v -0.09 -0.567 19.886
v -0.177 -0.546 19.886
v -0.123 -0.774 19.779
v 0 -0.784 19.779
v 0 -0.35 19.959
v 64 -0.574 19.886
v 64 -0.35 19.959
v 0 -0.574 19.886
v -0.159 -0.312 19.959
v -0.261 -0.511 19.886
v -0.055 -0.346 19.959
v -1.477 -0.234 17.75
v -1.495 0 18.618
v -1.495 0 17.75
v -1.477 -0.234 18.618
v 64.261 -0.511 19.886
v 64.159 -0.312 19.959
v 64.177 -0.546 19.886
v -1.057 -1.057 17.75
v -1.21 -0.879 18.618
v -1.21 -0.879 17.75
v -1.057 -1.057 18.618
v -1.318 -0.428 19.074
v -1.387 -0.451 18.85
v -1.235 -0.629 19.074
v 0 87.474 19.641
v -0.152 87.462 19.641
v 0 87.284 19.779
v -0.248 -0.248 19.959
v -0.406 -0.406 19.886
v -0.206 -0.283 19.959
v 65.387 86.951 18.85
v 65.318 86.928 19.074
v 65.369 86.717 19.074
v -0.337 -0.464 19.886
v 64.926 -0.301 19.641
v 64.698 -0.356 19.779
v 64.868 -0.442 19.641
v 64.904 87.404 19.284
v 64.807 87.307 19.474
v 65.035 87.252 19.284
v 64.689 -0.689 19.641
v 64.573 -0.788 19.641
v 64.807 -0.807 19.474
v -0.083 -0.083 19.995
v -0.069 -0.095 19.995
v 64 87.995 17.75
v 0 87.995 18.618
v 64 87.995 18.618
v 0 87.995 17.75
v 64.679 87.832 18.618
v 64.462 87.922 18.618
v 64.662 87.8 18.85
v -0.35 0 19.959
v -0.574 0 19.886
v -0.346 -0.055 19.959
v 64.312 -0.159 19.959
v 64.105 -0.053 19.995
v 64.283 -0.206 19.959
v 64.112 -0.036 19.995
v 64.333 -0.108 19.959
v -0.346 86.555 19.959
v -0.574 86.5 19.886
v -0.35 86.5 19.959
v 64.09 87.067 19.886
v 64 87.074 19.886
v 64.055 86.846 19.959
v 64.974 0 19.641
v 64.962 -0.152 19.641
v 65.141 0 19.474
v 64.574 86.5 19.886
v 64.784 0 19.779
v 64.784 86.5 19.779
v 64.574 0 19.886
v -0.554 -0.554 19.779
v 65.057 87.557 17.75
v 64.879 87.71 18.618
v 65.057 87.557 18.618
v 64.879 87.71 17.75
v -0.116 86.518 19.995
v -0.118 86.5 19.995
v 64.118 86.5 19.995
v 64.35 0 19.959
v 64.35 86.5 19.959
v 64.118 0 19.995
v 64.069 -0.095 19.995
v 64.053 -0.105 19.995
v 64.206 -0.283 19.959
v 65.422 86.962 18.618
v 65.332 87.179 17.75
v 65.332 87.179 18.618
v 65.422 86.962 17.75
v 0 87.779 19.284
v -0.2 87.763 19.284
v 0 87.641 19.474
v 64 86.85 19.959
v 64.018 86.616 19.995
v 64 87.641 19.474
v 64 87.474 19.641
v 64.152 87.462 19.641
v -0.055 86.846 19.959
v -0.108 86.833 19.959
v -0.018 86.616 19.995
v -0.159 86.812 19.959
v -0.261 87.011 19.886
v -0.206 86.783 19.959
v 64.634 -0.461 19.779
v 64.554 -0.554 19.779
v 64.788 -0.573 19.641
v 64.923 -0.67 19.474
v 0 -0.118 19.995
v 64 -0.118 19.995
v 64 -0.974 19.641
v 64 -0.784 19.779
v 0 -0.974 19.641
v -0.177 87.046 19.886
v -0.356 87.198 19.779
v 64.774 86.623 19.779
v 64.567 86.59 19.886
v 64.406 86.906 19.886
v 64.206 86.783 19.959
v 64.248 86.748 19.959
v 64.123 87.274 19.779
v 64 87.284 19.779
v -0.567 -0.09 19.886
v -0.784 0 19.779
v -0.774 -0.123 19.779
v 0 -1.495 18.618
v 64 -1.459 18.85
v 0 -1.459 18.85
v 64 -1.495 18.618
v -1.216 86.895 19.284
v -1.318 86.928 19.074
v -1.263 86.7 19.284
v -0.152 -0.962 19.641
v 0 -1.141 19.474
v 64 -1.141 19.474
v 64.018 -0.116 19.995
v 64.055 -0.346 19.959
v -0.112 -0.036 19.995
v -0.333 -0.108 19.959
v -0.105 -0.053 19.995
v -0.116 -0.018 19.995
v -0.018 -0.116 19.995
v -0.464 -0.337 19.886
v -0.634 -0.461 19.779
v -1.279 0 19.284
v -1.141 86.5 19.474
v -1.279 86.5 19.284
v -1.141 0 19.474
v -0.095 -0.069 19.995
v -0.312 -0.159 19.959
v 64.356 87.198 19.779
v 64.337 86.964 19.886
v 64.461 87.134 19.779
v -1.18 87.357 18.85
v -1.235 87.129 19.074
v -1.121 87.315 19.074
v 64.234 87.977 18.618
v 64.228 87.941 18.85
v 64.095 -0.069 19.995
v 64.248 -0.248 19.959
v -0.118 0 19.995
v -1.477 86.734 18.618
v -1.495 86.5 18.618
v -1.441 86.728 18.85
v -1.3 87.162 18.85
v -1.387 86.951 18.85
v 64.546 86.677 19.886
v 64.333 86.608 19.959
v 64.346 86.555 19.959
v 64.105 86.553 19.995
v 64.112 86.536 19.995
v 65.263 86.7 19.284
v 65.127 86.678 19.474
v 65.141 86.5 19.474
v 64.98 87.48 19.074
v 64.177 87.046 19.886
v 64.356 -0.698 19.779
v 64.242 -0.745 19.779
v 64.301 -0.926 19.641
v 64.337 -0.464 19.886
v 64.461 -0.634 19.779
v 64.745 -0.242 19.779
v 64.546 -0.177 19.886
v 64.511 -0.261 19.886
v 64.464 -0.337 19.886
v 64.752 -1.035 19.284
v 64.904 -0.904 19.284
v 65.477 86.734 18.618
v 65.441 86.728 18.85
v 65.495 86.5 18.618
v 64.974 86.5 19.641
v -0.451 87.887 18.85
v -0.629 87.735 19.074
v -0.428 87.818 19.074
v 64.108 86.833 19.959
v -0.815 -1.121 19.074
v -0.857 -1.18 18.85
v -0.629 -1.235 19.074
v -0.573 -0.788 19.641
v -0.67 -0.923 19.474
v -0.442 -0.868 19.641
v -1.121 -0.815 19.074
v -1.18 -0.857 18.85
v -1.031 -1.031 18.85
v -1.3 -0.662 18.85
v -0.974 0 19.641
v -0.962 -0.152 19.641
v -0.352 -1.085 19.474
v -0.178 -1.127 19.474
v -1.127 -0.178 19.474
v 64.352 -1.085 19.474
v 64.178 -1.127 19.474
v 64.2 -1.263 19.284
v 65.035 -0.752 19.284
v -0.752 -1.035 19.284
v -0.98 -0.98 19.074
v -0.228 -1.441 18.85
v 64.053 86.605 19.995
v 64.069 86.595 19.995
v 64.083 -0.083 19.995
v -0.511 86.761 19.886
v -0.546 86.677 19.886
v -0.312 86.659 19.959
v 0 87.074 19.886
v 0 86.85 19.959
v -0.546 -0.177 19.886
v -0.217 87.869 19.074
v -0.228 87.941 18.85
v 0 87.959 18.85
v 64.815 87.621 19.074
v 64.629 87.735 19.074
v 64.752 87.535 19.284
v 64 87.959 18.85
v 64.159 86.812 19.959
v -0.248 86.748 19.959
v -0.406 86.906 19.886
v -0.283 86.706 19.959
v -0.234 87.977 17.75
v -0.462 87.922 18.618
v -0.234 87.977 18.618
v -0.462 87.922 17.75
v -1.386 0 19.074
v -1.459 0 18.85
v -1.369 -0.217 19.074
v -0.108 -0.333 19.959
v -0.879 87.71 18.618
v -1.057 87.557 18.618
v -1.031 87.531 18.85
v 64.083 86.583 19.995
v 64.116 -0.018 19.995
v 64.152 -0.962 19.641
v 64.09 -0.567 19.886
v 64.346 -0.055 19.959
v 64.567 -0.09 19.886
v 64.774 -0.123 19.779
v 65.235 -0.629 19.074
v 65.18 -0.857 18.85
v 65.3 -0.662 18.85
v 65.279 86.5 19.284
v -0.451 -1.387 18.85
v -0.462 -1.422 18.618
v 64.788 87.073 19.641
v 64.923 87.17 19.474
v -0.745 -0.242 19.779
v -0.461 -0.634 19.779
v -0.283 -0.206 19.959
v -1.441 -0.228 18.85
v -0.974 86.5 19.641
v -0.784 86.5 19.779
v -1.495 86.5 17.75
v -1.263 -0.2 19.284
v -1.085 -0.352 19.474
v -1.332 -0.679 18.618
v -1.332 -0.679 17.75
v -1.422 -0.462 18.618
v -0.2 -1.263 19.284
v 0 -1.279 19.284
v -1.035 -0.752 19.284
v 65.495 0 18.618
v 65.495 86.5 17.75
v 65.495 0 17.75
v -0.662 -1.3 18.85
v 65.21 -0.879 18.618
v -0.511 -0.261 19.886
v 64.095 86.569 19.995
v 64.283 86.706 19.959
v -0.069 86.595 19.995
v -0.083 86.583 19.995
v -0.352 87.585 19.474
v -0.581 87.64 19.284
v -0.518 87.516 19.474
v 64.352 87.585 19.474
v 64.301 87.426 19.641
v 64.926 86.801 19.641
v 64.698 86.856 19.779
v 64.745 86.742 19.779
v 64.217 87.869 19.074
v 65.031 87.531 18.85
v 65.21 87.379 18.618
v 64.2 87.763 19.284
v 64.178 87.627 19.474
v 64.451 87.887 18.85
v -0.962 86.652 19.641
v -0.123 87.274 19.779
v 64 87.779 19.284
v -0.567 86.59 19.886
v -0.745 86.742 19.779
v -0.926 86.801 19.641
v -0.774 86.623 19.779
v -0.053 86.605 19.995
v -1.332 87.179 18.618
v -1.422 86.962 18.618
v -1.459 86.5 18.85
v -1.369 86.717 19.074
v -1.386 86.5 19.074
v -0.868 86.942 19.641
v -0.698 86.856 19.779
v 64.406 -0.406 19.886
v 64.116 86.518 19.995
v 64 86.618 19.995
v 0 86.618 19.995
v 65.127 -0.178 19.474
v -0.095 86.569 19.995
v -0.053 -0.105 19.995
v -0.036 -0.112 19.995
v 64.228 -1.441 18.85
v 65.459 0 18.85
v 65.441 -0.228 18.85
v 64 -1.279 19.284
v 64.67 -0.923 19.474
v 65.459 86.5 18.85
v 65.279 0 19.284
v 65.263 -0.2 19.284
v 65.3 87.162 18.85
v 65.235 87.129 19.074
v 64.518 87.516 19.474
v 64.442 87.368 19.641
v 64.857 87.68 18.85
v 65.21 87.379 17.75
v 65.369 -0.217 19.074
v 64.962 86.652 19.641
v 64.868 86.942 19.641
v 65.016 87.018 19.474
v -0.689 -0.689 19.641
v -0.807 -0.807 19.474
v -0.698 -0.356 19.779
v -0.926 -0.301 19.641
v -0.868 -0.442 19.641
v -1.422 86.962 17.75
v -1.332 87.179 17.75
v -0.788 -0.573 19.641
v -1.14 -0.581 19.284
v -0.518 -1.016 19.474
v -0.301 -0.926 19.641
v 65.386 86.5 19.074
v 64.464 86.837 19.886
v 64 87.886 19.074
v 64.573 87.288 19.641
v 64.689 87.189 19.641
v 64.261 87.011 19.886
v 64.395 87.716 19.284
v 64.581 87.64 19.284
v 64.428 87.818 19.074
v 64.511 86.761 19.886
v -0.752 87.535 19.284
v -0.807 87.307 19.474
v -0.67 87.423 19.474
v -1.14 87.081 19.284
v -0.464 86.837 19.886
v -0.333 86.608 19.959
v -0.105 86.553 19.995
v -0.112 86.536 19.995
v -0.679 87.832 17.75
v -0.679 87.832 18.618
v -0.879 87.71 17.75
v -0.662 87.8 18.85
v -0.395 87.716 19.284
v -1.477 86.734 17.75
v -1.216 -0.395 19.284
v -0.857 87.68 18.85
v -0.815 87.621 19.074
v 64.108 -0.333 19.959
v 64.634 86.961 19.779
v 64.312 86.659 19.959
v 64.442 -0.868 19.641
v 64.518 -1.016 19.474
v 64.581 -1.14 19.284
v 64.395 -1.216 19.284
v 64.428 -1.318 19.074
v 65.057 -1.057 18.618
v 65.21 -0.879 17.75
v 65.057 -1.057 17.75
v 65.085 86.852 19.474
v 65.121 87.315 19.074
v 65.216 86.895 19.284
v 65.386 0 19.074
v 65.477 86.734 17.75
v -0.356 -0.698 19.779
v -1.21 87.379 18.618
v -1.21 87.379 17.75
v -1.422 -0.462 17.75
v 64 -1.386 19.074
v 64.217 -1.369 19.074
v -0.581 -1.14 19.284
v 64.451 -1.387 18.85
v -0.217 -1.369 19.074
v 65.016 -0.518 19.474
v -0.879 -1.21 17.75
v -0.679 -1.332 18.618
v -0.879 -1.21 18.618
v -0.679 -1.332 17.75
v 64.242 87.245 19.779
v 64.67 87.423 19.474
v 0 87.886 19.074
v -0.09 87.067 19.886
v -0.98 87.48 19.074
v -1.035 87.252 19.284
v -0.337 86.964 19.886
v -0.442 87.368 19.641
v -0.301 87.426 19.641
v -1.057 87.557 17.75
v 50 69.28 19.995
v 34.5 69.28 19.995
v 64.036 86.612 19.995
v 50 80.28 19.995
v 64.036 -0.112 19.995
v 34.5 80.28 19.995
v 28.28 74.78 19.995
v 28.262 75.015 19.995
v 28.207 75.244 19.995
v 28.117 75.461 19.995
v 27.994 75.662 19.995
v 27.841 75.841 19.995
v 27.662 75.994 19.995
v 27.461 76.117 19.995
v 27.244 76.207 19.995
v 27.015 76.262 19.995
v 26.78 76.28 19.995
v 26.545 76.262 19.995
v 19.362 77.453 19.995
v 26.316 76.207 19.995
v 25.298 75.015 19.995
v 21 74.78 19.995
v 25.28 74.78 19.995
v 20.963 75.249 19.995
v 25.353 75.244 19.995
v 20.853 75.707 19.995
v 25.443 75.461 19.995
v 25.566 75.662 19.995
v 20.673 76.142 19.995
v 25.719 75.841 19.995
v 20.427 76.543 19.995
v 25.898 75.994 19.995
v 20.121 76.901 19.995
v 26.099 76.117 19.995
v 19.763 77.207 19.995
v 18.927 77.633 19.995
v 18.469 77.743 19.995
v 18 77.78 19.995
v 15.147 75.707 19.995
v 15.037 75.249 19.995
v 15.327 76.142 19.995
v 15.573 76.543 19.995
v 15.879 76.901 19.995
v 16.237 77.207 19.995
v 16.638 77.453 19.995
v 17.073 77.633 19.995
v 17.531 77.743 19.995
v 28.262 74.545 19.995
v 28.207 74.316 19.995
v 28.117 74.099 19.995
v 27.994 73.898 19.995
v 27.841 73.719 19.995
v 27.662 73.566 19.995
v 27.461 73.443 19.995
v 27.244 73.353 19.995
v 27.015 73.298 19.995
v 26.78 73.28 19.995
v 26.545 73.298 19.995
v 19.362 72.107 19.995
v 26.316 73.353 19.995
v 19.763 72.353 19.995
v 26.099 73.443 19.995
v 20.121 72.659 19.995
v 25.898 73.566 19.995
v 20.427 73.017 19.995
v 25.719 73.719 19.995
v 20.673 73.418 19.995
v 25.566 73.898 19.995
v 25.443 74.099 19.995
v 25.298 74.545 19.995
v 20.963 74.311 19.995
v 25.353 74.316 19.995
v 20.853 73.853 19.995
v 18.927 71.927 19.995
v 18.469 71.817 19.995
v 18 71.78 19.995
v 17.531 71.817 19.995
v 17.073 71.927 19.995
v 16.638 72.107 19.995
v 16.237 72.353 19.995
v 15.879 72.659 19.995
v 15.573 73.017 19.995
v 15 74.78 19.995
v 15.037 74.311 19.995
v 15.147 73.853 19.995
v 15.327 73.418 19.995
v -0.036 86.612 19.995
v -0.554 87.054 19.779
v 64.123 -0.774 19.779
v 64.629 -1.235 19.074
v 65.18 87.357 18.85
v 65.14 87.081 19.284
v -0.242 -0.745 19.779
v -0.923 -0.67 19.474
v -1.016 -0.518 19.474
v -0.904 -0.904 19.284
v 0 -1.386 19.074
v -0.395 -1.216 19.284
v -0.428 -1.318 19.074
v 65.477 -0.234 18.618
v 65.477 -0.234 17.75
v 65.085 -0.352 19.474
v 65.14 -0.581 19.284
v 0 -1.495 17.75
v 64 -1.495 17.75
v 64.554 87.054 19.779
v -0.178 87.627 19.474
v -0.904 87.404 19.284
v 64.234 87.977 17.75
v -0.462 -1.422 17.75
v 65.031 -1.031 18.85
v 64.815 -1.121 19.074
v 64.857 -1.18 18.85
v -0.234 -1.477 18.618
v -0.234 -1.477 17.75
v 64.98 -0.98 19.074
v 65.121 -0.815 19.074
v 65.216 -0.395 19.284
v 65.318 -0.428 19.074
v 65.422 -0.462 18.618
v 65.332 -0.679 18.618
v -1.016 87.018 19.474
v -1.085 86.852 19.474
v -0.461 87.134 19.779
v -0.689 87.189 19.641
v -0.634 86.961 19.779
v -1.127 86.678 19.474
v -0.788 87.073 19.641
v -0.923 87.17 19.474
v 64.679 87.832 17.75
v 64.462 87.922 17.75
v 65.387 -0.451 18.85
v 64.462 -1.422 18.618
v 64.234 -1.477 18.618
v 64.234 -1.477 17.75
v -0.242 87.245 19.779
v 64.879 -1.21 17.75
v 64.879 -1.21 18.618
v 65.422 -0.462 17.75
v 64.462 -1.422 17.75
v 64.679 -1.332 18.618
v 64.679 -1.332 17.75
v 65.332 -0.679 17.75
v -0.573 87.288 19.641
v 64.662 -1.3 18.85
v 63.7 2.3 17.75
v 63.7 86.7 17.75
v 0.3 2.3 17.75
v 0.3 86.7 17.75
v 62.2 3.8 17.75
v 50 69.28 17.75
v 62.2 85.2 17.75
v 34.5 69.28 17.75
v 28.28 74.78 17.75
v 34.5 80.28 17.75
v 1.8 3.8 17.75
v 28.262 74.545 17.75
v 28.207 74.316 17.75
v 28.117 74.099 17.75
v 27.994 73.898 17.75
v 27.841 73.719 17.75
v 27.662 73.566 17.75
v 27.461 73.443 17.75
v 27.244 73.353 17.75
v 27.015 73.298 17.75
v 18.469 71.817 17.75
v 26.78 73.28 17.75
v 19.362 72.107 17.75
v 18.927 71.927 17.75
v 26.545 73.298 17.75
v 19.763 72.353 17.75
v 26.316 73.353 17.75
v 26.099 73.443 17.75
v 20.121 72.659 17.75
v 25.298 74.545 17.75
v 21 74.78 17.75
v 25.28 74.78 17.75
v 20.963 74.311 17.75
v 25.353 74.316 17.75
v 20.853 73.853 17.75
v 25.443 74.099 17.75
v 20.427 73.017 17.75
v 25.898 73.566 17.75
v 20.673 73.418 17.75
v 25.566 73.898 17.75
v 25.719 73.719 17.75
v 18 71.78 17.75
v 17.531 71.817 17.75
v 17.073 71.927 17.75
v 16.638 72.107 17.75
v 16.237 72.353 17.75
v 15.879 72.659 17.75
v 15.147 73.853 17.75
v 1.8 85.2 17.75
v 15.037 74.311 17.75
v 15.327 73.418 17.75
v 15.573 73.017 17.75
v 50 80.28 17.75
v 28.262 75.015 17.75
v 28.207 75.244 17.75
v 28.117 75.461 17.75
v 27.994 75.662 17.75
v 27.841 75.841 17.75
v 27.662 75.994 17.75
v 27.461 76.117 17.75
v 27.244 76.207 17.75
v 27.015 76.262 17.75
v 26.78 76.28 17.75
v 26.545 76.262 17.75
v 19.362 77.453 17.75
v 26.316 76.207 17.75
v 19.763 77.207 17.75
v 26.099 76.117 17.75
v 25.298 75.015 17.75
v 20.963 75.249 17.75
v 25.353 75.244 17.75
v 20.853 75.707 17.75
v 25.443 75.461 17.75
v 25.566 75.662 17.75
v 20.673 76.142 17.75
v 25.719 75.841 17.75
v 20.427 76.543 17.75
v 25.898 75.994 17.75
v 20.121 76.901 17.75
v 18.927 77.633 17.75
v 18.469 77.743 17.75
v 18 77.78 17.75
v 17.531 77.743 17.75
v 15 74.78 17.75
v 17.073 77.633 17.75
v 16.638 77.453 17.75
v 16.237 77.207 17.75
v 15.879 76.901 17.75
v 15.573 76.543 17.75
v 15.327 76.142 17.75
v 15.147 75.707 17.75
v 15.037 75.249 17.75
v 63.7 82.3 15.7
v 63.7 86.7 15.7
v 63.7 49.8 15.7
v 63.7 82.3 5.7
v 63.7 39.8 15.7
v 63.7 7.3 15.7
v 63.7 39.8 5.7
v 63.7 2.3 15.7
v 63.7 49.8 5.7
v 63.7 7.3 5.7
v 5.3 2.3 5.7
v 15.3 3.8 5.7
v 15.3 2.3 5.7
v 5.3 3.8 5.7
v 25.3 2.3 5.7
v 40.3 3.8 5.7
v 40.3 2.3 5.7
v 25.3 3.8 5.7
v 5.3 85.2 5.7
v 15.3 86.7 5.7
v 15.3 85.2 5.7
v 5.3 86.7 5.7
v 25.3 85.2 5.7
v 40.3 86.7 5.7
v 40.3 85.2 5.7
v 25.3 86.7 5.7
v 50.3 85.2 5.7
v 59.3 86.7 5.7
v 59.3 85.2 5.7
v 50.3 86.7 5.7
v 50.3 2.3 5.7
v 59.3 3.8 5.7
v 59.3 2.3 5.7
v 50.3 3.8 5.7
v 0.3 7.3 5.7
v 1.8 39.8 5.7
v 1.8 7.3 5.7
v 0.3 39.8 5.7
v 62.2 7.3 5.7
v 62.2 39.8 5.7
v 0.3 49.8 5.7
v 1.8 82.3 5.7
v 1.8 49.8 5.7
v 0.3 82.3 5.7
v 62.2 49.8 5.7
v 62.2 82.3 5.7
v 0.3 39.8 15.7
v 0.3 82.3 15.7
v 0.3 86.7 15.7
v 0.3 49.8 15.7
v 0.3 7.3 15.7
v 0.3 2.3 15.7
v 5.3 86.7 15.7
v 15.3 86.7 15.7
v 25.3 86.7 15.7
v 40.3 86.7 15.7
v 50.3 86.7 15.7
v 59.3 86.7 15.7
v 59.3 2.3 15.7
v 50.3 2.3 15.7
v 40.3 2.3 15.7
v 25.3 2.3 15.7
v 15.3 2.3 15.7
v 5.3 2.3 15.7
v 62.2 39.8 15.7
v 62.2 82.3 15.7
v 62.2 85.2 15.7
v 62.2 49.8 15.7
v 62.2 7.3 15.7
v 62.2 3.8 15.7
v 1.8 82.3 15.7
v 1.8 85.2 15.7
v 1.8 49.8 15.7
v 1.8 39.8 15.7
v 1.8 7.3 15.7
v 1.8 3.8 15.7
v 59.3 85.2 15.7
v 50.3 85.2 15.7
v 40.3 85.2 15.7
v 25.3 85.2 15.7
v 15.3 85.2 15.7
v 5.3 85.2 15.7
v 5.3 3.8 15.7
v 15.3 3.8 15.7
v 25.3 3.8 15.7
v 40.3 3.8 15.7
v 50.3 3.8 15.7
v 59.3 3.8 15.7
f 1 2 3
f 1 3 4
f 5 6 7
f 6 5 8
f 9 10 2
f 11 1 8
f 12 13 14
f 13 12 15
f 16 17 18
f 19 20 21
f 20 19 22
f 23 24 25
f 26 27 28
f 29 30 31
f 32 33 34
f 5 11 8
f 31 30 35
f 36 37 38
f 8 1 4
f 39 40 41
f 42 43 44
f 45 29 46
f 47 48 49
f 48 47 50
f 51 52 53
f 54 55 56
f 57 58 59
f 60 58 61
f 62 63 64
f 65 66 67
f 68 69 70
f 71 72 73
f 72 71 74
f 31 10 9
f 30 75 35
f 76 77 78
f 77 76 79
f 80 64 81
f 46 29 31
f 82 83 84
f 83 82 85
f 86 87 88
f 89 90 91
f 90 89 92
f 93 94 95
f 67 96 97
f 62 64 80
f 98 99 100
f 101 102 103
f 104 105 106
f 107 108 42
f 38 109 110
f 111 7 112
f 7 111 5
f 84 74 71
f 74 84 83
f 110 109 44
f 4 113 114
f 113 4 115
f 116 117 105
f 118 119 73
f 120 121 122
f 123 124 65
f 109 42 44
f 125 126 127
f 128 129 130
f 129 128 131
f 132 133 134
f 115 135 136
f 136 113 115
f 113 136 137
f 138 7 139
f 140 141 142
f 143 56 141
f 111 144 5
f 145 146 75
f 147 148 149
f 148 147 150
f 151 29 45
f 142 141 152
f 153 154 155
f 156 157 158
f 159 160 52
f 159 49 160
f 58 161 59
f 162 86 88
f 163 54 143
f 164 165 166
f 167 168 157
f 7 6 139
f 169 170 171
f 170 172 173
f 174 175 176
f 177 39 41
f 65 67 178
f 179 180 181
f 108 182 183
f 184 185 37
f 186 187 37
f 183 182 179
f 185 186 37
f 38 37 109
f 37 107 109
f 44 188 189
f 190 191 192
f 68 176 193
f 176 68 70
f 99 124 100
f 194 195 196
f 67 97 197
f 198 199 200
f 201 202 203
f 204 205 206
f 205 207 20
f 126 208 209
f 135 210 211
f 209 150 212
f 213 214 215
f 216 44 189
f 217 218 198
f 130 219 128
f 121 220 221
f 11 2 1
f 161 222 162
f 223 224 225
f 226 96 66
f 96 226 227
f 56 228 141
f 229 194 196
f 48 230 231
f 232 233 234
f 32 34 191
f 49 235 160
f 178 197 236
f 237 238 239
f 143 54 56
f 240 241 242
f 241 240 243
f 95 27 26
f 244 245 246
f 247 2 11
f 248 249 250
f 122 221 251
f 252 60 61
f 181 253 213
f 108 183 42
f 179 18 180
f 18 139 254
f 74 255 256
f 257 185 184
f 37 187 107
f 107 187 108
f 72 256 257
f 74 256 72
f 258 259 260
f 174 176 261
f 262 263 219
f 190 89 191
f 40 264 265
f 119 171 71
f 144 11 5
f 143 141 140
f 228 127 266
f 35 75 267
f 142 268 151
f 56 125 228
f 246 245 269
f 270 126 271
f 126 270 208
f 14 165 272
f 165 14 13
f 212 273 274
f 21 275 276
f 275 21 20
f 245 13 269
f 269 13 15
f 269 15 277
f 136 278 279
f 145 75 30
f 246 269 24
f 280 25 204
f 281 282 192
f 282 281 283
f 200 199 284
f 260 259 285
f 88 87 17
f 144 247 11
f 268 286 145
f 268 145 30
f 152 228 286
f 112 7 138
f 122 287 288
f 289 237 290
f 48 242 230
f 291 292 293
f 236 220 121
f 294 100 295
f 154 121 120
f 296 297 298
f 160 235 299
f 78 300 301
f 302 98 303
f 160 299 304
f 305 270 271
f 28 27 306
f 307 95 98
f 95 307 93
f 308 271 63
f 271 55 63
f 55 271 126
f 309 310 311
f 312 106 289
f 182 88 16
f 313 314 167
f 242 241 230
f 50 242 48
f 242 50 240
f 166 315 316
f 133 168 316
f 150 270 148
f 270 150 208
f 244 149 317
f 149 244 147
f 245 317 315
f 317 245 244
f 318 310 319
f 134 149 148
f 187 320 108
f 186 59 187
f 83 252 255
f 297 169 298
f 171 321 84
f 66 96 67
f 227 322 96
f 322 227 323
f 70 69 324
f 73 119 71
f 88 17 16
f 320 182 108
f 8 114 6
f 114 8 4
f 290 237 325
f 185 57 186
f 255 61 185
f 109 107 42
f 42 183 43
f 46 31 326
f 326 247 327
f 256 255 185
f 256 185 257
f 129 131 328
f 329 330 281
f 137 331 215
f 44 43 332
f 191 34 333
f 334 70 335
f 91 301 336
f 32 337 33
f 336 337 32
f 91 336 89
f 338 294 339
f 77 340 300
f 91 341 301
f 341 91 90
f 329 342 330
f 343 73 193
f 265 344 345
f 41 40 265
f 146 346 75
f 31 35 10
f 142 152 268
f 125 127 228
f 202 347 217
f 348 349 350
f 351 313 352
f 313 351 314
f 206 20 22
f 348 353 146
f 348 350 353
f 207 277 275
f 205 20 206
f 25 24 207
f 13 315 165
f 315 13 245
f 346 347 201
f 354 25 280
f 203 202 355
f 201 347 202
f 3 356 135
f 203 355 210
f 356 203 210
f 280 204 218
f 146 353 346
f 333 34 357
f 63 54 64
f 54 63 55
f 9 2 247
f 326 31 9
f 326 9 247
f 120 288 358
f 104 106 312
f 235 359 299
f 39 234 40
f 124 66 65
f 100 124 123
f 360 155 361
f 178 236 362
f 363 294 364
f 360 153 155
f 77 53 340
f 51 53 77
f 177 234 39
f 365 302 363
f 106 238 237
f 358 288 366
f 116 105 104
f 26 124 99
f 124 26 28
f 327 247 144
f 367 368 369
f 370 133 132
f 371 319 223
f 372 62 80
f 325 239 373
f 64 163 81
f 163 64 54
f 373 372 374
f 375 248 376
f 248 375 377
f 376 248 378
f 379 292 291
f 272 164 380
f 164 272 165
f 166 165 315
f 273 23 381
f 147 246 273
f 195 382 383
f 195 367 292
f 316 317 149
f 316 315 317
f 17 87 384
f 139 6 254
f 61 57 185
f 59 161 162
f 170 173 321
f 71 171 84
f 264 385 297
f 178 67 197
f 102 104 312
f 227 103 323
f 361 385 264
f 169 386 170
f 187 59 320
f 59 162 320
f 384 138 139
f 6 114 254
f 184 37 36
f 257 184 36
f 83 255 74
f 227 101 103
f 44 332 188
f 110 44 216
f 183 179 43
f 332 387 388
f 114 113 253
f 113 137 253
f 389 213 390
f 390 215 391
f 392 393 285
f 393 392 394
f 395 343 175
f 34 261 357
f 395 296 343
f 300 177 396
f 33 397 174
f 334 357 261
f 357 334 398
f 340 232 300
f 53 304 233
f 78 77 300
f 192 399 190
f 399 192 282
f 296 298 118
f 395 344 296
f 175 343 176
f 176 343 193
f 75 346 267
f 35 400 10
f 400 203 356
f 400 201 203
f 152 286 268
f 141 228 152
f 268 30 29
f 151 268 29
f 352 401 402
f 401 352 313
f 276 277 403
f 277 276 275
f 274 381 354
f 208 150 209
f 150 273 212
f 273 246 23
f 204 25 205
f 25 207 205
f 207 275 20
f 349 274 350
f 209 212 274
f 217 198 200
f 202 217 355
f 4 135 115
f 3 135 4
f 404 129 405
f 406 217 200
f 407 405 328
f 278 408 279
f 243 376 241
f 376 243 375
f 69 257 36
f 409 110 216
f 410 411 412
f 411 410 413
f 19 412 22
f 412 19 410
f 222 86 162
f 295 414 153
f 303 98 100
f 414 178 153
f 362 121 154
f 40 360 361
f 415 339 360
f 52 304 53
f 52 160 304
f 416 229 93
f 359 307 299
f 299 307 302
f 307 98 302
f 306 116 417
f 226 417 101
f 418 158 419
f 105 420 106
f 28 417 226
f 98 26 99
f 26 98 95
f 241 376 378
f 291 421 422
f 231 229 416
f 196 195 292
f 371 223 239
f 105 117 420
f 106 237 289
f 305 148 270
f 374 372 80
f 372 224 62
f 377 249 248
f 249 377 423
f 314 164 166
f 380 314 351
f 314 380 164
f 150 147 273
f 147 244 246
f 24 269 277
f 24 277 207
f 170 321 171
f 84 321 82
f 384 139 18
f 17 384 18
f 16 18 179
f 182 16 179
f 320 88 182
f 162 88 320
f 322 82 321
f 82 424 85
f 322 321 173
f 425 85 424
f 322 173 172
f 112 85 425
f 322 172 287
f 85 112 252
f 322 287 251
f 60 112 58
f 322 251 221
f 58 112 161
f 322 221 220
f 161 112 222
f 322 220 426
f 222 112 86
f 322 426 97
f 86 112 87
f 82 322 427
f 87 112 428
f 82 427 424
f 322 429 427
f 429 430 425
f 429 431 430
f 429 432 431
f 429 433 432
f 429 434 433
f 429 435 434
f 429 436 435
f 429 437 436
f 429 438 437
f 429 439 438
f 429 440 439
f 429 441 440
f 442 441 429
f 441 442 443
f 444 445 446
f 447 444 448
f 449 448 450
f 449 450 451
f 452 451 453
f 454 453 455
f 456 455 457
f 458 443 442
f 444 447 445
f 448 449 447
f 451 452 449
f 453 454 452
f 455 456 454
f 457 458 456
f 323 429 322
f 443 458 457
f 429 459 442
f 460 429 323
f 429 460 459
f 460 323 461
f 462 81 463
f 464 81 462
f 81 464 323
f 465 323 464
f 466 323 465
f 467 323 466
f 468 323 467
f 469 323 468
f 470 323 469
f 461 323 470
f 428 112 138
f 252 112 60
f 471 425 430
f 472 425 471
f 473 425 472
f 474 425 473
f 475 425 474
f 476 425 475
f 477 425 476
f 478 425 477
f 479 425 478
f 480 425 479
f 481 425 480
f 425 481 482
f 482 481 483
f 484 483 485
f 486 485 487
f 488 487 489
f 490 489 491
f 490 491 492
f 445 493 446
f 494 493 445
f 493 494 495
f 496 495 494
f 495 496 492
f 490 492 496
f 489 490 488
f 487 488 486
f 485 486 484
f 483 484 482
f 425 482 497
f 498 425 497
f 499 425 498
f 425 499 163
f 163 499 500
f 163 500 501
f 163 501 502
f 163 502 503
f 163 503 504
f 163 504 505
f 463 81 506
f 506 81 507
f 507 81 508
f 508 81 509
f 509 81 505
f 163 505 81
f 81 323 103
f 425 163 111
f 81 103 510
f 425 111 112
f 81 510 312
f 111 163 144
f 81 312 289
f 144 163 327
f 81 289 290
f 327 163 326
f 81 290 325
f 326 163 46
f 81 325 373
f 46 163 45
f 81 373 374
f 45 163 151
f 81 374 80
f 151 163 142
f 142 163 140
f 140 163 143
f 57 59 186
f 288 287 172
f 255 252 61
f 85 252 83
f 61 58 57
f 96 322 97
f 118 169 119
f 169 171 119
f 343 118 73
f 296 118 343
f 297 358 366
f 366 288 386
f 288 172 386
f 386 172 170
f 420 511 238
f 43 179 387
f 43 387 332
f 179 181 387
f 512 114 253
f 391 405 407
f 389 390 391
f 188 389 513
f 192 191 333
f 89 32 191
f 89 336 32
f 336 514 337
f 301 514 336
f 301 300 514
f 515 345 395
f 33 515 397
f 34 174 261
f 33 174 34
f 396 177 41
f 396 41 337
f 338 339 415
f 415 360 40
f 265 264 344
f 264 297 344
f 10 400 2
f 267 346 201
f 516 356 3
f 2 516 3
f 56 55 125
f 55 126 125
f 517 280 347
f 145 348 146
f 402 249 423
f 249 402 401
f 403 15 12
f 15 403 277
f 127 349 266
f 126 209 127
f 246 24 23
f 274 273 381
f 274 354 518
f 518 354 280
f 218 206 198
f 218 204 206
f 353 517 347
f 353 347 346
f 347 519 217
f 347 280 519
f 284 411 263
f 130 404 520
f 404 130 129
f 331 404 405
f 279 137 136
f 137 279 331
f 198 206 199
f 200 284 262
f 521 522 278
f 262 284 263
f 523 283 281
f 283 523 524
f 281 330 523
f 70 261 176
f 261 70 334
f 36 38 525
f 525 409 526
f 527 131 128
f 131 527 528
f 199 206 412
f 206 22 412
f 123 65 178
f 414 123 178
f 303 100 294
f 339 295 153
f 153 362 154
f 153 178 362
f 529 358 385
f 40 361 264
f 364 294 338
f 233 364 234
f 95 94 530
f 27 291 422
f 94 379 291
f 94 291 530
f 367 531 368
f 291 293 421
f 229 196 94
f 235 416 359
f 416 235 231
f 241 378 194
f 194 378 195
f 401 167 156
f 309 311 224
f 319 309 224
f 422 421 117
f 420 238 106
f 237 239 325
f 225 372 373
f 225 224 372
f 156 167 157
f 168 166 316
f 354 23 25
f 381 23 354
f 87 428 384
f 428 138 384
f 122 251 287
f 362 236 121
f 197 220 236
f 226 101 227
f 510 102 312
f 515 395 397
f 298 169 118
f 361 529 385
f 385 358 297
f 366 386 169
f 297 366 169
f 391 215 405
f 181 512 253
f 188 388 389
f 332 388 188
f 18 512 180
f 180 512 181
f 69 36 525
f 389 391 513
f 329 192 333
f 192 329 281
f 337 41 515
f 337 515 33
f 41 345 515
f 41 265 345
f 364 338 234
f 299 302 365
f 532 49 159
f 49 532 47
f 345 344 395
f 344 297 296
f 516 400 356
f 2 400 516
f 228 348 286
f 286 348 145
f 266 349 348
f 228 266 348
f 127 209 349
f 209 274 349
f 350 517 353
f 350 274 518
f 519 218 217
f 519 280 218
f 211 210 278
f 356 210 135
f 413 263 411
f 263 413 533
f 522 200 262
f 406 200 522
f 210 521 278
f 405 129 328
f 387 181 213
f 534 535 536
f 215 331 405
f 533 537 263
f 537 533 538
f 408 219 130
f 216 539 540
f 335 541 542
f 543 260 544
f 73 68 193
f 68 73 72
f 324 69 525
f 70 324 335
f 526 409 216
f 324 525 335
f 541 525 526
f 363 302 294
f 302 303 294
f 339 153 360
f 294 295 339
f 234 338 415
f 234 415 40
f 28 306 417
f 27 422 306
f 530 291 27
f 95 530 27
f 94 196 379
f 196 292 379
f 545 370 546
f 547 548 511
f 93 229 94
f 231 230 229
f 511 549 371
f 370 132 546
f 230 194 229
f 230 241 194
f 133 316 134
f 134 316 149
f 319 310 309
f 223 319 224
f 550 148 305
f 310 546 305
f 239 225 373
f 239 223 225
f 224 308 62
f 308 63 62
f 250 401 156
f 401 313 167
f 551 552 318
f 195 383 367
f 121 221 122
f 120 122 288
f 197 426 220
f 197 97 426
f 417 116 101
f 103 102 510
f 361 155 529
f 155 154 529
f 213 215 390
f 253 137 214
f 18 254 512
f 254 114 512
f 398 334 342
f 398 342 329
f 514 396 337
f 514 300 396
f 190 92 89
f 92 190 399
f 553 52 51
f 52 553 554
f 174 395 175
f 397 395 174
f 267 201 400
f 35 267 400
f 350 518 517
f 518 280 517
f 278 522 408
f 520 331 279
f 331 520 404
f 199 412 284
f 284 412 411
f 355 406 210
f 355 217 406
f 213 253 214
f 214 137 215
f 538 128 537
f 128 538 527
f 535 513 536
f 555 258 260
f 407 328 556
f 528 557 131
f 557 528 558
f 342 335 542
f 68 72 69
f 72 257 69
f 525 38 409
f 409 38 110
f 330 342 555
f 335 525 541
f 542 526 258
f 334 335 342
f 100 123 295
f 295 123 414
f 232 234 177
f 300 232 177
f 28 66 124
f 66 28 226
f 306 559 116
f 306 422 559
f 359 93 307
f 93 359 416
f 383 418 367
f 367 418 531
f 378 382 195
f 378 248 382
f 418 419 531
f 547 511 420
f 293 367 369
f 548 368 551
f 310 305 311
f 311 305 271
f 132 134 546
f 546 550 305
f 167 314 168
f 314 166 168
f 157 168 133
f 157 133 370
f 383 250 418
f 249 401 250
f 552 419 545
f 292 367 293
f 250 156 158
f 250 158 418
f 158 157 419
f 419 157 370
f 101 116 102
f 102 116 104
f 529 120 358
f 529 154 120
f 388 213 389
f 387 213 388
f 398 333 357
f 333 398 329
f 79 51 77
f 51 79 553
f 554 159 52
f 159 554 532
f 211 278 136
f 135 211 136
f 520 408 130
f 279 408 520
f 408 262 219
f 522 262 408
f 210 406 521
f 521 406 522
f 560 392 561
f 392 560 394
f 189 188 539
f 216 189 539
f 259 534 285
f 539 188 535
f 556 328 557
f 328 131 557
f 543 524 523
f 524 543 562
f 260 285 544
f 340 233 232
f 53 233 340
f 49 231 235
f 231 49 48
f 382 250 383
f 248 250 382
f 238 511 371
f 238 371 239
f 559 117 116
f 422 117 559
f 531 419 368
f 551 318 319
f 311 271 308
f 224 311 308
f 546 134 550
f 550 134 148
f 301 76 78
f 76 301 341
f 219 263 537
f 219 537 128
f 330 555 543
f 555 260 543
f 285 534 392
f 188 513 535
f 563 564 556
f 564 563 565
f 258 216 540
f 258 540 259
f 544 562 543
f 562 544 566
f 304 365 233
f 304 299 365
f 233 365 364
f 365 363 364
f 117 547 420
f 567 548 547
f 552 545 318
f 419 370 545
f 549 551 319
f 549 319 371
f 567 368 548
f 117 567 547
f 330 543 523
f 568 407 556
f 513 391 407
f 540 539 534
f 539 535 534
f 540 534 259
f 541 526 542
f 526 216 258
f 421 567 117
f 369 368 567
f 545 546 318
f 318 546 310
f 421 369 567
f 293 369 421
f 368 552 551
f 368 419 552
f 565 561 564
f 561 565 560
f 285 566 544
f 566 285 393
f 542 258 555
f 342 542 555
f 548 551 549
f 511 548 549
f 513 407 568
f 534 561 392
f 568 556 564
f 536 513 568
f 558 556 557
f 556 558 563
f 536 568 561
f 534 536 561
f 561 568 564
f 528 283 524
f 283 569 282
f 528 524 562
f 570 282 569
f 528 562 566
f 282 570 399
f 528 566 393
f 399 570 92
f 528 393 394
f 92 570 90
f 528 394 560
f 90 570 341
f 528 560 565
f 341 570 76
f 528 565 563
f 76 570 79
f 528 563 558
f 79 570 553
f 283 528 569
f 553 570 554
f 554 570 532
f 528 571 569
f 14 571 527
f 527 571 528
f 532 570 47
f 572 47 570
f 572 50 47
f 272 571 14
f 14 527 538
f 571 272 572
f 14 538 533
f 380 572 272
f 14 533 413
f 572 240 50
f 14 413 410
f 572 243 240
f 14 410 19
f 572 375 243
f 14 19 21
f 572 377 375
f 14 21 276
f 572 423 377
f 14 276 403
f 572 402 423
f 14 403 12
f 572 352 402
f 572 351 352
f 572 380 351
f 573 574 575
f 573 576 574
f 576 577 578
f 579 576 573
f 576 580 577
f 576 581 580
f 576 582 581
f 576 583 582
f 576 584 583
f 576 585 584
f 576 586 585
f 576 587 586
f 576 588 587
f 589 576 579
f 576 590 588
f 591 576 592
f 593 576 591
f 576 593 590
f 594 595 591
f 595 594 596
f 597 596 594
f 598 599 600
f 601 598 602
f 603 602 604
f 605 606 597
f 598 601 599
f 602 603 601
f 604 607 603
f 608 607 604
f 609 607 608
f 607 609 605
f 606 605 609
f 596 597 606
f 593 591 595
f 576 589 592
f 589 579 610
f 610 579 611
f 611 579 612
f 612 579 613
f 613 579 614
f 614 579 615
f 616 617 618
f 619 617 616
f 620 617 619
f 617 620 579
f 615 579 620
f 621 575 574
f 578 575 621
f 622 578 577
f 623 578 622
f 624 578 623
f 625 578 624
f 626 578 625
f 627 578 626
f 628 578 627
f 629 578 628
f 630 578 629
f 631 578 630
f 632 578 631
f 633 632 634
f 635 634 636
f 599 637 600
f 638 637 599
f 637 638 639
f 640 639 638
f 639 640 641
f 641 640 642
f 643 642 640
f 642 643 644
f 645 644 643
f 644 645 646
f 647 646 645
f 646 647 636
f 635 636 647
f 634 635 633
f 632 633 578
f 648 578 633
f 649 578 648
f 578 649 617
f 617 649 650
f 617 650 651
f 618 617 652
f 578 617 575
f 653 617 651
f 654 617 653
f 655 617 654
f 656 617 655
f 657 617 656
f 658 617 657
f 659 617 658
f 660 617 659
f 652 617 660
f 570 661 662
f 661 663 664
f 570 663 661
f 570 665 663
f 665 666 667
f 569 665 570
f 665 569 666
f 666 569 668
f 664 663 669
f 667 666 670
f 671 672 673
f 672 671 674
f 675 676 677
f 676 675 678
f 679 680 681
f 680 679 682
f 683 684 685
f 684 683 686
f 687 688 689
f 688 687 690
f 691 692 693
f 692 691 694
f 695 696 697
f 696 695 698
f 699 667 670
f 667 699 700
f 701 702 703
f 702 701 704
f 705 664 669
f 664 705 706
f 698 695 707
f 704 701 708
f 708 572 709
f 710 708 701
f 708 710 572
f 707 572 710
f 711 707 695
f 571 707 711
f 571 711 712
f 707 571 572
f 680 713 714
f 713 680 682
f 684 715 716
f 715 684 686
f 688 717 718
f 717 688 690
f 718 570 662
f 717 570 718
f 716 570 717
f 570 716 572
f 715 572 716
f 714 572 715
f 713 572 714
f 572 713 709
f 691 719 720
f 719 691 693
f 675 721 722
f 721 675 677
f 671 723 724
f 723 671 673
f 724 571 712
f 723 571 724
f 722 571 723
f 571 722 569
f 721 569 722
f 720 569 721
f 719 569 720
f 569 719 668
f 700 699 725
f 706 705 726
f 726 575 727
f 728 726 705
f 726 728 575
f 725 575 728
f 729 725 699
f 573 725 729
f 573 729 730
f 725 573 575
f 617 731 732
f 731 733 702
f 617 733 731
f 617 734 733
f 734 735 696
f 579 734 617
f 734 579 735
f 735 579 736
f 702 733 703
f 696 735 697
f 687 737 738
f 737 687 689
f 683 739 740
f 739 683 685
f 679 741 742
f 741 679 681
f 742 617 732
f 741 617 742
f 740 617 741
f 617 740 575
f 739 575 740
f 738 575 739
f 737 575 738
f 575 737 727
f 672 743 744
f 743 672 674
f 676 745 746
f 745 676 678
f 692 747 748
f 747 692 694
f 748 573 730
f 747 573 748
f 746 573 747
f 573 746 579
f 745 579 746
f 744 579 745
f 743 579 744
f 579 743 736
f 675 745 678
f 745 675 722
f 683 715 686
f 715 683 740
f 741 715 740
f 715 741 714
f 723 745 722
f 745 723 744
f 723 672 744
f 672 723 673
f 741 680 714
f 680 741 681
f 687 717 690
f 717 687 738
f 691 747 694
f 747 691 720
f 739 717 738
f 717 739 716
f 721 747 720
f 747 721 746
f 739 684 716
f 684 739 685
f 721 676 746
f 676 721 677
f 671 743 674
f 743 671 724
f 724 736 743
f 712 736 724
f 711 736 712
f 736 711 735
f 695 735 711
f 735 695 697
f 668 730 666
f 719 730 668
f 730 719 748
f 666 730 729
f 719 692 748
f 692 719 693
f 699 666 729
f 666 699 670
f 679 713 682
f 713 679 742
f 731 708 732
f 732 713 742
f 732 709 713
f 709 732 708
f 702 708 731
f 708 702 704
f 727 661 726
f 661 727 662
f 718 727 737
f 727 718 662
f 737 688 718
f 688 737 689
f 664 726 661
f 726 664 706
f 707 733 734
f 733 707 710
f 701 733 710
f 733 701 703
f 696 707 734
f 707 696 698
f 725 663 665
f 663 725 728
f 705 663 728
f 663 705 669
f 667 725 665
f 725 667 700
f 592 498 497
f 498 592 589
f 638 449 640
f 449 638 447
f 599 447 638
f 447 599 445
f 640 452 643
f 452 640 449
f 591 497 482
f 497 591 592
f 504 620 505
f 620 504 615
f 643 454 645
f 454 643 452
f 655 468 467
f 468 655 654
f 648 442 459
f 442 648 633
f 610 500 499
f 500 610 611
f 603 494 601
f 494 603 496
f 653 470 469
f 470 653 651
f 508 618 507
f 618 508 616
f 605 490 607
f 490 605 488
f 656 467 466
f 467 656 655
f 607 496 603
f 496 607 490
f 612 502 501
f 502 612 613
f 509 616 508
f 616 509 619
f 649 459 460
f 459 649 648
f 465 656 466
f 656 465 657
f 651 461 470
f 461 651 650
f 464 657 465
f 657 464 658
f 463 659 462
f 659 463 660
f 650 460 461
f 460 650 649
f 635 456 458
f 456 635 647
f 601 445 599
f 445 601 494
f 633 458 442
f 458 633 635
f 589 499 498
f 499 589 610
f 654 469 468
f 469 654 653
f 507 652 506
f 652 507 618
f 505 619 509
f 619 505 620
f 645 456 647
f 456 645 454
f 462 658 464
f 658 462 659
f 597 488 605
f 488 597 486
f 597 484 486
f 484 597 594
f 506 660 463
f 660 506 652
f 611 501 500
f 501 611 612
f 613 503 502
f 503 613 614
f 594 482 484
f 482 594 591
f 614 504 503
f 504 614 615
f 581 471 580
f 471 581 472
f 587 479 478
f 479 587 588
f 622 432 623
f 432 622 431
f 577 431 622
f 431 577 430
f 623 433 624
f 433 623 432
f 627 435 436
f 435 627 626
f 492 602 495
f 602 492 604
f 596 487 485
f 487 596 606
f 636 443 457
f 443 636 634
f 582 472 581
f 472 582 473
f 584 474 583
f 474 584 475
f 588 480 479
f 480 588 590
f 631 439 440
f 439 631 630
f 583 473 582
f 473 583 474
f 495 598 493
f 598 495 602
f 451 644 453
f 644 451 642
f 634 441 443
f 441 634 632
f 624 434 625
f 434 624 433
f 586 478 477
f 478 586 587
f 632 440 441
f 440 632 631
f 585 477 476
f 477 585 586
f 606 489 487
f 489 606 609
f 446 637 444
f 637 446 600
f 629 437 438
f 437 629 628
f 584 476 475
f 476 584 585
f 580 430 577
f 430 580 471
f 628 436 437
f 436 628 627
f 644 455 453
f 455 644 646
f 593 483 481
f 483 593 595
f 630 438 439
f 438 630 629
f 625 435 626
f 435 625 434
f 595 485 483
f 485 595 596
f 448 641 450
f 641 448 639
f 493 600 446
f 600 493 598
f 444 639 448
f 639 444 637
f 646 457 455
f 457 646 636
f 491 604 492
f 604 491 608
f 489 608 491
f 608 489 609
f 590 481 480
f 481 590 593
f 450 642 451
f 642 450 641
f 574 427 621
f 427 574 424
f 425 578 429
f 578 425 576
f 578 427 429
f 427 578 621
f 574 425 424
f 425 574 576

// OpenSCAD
$fn=40;  // Alto número de caras de polígonos

/********************************************
*** TAPA WIMUMO 005 
********************************************/

ap = 1.5; // ancho pared
ai = 17; // alto interno 
xi = 64; // largo interno en x
yi = 110; // largo en y
cp = 2; // cubre-plug
ypcb = 85;// largo pcb

difference(){
    
    // Cuerpo de la tapa 
    union(){
        intersection(){
            
            //caja_completa();
            // obtengo la tapa
            //translate([-5,-5,ai]){cube([80,82,20]);};
        }
        
        // TAPA PRINCIPAL
        translate([0,0,ai]){caja_tapa(ap,ap,xi,ypcb+ap);}
        // borde
        alto_b = ai-3-1.7;
        margen = 0.3;
        reborde(0+margen,0+cp+margen,ai-alto_b+1,
        ypcb-2*margen,xi-2*margen,1.5,alto_b);
        
        // TAPA BATERIAS -> pasada a otro archivo
        /*
        translate([0,ypcb+cp+2*ap,ai]){
            caja_tapa(ap,ap,xi,yi-ypcb-cp-2*ap);
         }
        alto_tb = 10 ;
        difference(){
        reborde(0+margen,ypcb+cp+3*ap+margen,ai-alto_tb+1,
        yi-ypcb-cp-ap*3-2*margen,xi-2*margen,1.5,alto_tb);
            
         translate([margen+ap,ypcb+cp+2*ap,6]){cube([xi-2*margen-2*ap,20,ai-ap-8]);}
        //translate([]){cube([]);}
        }
        
        */
        
       
        
    };
    
    // Agujeros para botones
    px = 6+2;       // posicion de los postes
    py = 6+cp+2;
    
    // LED
     translate([px+10,py+68-3.22,ai-5]){cylinder(10,3,3);}
    // Reset
    translate([px+18.78,py+68-3.22,ai-5]){cylinder(10,1.5,1.5);};
    // Tecla ON/OFF
    htec = 11;
    translate([px+26.5,py+68-3.22-htec/2,ai-5]){
        cube([42-26.5,htec,16]);
     };
    
}

/* reborde */
module reborde(x,y,z,w,l,a,h){
    translate([x,y,z]){
      difference(){
        // Gran borde
        cube([l,w,h]);
        // Hueco
        translate([a,a,-1]){
          cube([l-2*a,w-2*a,h+2]);
        }
        // Ranuras para formar solapas
        // frente y atras
        translate([15,-5,-7]){
          cube([10,120,ai]);
        }
        translate([40,-5,-7]){
          cube([10,120,ai]);
        }
        // esquineras
        translate([-5,-5,-7]){
          cube([10,10,ai]);
        }
        translate([xi-5,-5,-7]){
          cube([10,10,ai]);
        }
        translate([-5,ypcb-5,-7]){
          cube([10,15,ai]);
        }
        translate([xi-5,ypcb-5,-7]){
          cube([10,15,ai]);
        }
        // Laterales
        translate([-5,ypcb/2-5,-7]){
          cube([10,10,ai]);
        }
        translate([xi-5,ypcb/2-5,-7]){
          cube([10,10,ai]);
        }
        
      }
    
    };

}


/* CAJA */
module caja_completa(){
// Caja completa
    
ap = 1.5; // ancho pared
ai = 17; // alto interno 
xi = 64; // largo interno en x
yi = 110;
cp = 2; // cubre-plug
ypcb = 85;// largo pcb

union(){
    
difference(){
    // Caja completa
    union(){
        difference(){
            // Casco de la caja
            caja(ap,ai,xi,yi);
            
            // Hueco principal de la caja
            translate([0,cp,0]){cube([xi,yi-cp,ai+0.1]);};
            
            //hueco de los cables
            translate([0,cp+2,0]){huecoCables();};
        }

        translate([2,cp+2,0]){postes();}
        
        // Pared separadora batería
        translate([0,cp+ypcb,0]){
        cube([xi,ap*3,ai]);
        };
        
       
        
  
    };
    
    // Saco la tapa
    translate([-5,-5,ai]){cube([80,150,20]);};
    
    // Hago una zanja y agujeritos para que pasen los cables del 
    // portapilas
        caladuraCablesPilas();
        translate([xi-4,0,0]){
            caladuraCablesPilas();
         };
    };

}

}


/*
*   MODULOS PARA LA CAJA
*/

//Cuerpo Caja inferior    
module caja(ap,ai,xi,yi){
    hull() {
        // Vertice A
        translate([0,0,0])
            sphere(r=ap);
        translate([0,0,ai])   
            sphere(r=ap);
        // Vertice B        
        translate([0,yi,0])
          sphere(r=ap);
        translate([0,yi,ai])   
         sphere(r=ap);        
        // Vertice C     
        translate([xi,0,0]) 
            sphere(r=ap);
        translate([xi,0,ai])   
            sphere(r=ap);   
        // Vertice D     
        translate([xi,yi,0])
            sphere(r=ap);
        translate([xi,yi,ai])   
            sphere(r=ap);   
    } 
};

module caja_tapa(ap,ai,xi,yi){
 difference(){
        hull() {
        // Vertice A
        translate([0,0,0])
            sphere(r=ap);
        translate([0,0,ai])   
            sphere(r=ap);
        // Vertice B        
        translate([0,yi,0])
          sphere(r=ap);
        translate([0,yi,ai])   
         sphere(r=ap);        
        // Vertice C     
        translate([xi,0,0]) 
            sphere(r=ap);
        translate([xi,0,ai])   
            sphere(r=ap);   
        // Vertice D     
        translate([xi,yi,0])
            sphere(r=ap);
        translate([xi,yi,ai])   
            sphere(r=ap);   
    } 
        translate([-5,-5,ai-ap/2-10]){cube([80,120,10]);}
    }
   
};



module caladuraCablesPilas(){
    translate([-1,91.5,-1]){
        cube([6,15,5]);
        };
     translate([2,95,2]){
        rotate([90,0,0]){
         cylinder(10,2,2);
        }
        };
        
}

module huecoCables(){
    borde = 9;
    dist = 12;
    a = 12;
    rad = 3;
    largo = 10;
    translate([borde+dist,0,a]){
            rotate([90,90,0]){cylinder(h=largo,r=rad);}
        }
    translate([borde+dist*3,0,a]){
            rotate([90,90,0]){cylinder(h=largo,r=rad);}
        }
}
// Postes placa 
module postes(){
    
    translate([6,6,0]){   
        poste();
    }
    translate([6+48,6,0]){
       poste();
    }
     translate([6,6+68,0]){
       poste();
    }
    translate([6+48,6+68,0]){
       poste();
    }
}

module poste(){ 
  difference(){
    union(){
    cylinder(8, 2.7, 2.7);
    cylinder(2.5, 5, 5);        
    }
    cylinder(10, 1, 1);
  }
}
